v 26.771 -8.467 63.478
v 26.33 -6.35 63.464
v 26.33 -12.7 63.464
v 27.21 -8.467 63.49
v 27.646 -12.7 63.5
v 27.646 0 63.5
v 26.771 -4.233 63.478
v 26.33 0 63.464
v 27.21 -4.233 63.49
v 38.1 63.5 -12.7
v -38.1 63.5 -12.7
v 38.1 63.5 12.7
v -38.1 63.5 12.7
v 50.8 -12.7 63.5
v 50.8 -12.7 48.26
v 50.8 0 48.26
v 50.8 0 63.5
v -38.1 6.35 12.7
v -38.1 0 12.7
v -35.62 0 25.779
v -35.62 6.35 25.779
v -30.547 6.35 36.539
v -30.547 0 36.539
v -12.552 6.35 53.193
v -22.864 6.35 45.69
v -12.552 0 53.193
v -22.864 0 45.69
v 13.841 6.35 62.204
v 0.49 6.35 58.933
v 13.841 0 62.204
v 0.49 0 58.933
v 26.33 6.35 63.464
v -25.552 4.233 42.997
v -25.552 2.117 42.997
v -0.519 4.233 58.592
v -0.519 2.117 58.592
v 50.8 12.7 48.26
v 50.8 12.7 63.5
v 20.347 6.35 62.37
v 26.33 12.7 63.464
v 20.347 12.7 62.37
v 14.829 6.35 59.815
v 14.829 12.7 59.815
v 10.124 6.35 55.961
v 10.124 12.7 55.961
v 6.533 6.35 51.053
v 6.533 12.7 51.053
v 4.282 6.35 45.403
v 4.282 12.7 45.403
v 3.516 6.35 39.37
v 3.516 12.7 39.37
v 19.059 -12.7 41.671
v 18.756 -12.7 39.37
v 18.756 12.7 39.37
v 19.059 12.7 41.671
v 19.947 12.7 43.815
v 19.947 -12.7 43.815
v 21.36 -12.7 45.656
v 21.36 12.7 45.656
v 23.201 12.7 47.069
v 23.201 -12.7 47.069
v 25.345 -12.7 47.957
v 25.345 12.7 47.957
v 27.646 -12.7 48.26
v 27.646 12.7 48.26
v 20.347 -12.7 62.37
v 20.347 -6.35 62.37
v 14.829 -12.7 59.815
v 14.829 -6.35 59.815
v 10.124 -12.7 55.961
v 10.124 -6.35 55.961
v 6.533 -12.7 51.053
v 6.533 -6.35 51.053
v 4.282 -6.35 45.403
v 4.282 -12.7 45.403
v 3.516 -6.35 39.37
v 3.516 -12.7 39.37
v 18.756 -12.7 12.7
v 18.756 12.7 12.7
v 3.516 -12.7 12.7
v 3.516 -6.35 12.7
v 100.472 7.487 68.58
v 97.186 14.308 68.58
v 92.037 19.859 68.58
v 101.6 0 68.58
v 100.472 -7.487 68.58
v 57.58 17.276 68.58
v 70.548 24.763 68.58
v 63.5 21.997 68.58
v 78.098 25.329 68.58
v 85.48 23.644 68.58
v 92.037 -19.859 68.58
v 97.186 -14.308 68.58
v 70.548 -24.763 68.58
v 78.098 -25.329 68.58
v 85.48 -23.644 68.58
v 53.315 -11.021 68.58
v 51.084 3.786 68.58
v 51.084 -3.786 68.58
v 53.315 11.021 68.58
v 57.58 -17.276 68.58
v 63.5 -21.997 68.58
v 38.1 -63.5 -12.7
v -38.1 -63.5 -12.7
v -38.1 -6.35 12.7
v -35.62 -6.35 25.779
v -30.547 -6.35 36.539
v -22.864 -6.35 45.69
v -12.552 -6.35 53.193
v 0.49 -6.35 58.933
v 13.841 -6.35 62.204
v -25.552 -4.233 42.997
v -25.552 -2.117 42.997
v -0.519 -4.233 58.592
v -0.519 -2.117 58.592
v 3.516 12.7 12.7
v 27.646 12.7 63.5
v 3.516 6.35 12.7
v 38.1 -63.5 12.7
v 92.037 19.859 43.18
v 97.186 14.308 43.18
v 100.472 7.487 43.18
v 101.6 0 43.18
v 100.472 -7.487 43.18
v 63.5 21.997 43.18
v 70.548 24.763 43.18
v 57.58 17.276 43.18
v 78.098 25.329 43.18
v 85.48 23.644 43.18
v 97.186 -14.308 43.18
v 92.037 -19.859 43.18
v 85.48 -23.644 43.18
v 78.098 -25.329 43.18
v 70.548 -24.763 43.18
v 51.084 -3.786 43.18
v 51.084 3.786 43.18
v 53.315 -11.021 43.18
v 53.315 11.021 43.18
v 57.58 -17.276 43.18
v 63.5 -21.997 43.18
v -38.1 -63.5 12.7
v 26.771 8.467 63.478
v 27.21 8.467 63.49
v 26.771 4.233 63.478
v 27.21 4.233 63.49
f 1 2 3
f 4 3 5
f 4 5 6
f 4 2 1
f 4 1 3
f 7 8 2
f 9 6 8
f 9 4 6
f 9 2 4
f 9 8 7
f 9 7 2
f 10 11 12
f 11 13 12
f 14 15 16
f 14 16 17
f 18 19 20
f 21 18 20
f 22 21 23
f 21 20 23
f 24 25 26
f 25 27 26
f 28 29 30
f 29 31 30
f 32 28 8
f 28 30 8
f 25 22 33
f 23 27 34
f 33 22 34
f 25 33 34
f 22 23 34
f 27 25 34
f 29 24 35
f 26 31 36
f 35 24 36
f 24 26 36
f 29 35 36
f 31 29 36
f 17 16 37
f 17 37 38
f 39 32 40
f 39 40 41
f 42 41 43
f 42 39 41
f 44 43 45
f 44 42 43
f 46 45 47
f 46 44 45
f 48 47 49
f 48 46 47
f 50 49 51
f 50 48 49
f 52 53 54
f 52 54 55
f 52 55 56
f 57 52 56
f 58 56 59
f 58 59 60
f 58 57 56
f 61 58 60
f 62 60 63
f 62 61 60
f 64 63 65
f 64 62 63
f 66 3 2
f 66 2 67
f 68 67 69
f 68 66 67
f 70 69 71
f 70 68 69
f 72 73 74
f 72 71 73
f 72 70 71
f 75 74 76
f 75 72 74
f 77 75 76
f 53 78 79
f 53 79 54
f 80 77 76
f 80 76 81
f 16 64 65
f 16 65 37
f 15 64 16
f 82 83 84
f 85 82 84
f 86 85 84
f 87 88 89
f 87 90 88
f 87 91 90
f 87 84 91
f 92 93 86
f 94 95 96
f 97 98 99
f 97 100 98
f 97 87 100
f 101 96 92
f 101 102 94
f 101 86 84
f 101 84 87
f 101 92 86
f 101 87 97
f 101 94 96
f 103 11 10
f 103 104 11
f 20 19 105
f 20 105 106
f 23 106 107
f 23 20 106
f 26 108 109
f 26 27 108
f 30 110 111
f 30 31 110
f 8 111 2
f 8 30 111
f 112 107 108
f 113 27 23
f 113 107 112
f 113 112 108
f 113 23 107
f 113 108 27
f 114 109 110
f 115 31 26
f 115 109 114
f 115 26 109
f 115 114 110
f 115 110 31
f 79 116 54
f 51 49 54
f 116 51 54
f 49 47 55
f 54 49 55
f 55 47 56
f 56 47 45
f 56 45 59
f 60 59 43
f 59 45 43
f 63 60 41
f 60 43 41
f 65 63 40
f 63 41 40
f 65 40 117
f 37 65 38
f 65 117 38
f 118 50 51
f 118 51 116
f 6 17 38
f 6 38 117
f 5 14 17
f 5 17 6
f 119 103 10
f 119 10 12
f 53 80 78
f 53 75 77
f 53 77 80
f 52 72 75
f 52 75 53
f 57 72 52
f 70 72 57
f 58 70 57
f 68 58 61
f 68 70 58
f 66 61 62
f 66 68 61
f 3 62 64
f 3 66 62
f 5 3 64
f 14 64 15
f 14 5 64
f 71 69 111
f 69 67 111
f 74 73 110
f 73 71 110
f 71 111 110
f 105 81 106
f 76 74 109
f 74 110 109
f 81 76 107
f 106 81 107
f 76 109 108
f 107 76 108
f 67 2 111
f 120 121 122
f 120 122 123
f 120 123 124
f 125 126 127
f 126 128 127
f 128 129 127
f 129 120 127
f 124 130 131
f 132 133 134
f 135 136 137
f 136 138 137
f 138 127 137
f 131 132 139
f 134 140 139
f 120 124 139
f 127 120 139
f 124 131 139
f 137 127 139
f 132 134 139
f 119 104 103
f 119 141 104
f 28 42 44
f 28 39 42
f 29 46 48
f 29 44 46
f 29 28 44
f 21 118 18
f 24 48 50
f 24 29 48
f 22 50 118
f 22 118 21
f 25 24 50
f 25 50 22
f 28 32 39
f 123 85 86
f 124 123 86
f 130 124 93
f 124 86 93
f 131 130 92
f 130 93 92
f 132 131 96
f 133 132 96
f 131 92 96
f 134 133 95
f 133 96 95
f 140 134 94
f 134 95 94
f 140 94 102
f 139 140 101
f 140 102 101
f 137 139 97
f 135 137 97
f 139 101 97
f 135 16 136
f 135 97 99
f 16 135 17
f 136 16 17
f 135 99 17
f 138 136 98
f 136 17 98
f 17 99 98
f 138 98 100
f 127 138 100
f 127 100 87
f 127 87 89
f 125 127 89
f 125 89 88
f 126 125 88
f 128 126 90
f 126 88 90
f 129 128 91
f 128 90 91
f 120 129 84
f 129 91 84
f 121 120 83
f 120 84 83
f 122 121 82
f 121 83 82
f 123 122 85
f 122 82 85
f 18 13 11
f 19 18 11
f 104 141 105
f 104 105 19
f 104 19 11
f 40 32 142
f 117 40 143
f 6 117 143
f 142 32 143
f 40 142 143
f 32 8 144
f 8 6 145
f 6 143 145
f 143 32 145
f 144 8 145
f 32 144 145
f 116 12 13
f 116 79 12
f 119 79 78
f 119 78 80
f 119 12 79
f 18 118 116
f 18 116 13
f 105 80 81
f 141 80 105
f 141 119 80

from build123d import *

# Parameters (mm, degrees)
F1_DEPTH = 63.5
F2_DEPTH = 12.7
F3_DEPTH = 6.35
F0_W     = 25.4
F0_H     = 25.4


with BuildPart() as f1:
    # F0 (on Front) → F1 (new body, symmetric)
    with BuildSketch(Plane.XZ):
        Polygon((-38.1, -12.7), (38.1, -12.7), (38.1, 12.7), (18.755794, 12.7), (3.515794, 12.7), (-38.1, 12.7), align=None)
    extrude(amount=F1_DEPTH, both=True)

    # F0 (on Front) → F2 (join, symmetric)
    with BuildSketch(Plane.XZ):
        with BuildLine():
            Line((3.515794, 12.7), (18.755794, 12.7))
            Line((18.755794, 12.7), (18.755794, 39.37))
            ThreePointArc((18.755794, 39.37), (21.359615, 45.656179), (27.645794, 48.26))
            Line((27.645794, 48.26), (50.8, 48.26))
            Line((50.8, 48.26), (50.8, 63.5))
            Line((50.8, 63.5), (27.645794, 63.5))
            add(Edge.make_bspline(
                [(26.329729, 63.464084), (26.772972, 63.479413), (27.211759, 63.491349), (27.645794, 63.5)],
                knots=[81.590711, 81.590711, 81.590711, 81.590711, 83.085194, 83.085194, 83.085194, 83.085194], degree=3))
            ThreePointArc((26.329729, 63.464084), (10.124185, 55.960664), (3.515794, 39.37))
            Line((3.515794, 39.37), (3.515794, 12.7))
        make_face()
    extrude(amount=F2_DEPTH, both=True)

    # F0 (on Front) → F3 (join, symmetric)
    with BuildSketch(Plane.XZ):
        with BuildLine():
            add(Edge.make_bspline(
                [(-38.1, 12.7), (-35.351976, 51.67364), (2.131002, 62.62717), (26.329729, 63.464084)],
                knots=[0, 0, 0, 0, 81.590711, 81.590711, 81.590711, 81.590711], degree=3))
            Line((-38.1, 12.7), (3.515794, 12.7))
            Line((3.515794, 12.7), (3.515794, 39.37))
            ThreePointArc((3.515794, 39.37), (10.124185, 55.960664), (26.329729, 63.464084))
        make_face()
    extrude(amount=F3_DEPTH, both=True)

    # F0 (on Front) → F4 (revolve)
    with BuildSketch(Plane.XZ):
        with Locations((88.9, 55.88)):
            Rectangle(F0_W, F0_H)
    revolve(axis=Axis((76.2, 0, 55.88), (0, 0, -1)))


solid = f1.part
